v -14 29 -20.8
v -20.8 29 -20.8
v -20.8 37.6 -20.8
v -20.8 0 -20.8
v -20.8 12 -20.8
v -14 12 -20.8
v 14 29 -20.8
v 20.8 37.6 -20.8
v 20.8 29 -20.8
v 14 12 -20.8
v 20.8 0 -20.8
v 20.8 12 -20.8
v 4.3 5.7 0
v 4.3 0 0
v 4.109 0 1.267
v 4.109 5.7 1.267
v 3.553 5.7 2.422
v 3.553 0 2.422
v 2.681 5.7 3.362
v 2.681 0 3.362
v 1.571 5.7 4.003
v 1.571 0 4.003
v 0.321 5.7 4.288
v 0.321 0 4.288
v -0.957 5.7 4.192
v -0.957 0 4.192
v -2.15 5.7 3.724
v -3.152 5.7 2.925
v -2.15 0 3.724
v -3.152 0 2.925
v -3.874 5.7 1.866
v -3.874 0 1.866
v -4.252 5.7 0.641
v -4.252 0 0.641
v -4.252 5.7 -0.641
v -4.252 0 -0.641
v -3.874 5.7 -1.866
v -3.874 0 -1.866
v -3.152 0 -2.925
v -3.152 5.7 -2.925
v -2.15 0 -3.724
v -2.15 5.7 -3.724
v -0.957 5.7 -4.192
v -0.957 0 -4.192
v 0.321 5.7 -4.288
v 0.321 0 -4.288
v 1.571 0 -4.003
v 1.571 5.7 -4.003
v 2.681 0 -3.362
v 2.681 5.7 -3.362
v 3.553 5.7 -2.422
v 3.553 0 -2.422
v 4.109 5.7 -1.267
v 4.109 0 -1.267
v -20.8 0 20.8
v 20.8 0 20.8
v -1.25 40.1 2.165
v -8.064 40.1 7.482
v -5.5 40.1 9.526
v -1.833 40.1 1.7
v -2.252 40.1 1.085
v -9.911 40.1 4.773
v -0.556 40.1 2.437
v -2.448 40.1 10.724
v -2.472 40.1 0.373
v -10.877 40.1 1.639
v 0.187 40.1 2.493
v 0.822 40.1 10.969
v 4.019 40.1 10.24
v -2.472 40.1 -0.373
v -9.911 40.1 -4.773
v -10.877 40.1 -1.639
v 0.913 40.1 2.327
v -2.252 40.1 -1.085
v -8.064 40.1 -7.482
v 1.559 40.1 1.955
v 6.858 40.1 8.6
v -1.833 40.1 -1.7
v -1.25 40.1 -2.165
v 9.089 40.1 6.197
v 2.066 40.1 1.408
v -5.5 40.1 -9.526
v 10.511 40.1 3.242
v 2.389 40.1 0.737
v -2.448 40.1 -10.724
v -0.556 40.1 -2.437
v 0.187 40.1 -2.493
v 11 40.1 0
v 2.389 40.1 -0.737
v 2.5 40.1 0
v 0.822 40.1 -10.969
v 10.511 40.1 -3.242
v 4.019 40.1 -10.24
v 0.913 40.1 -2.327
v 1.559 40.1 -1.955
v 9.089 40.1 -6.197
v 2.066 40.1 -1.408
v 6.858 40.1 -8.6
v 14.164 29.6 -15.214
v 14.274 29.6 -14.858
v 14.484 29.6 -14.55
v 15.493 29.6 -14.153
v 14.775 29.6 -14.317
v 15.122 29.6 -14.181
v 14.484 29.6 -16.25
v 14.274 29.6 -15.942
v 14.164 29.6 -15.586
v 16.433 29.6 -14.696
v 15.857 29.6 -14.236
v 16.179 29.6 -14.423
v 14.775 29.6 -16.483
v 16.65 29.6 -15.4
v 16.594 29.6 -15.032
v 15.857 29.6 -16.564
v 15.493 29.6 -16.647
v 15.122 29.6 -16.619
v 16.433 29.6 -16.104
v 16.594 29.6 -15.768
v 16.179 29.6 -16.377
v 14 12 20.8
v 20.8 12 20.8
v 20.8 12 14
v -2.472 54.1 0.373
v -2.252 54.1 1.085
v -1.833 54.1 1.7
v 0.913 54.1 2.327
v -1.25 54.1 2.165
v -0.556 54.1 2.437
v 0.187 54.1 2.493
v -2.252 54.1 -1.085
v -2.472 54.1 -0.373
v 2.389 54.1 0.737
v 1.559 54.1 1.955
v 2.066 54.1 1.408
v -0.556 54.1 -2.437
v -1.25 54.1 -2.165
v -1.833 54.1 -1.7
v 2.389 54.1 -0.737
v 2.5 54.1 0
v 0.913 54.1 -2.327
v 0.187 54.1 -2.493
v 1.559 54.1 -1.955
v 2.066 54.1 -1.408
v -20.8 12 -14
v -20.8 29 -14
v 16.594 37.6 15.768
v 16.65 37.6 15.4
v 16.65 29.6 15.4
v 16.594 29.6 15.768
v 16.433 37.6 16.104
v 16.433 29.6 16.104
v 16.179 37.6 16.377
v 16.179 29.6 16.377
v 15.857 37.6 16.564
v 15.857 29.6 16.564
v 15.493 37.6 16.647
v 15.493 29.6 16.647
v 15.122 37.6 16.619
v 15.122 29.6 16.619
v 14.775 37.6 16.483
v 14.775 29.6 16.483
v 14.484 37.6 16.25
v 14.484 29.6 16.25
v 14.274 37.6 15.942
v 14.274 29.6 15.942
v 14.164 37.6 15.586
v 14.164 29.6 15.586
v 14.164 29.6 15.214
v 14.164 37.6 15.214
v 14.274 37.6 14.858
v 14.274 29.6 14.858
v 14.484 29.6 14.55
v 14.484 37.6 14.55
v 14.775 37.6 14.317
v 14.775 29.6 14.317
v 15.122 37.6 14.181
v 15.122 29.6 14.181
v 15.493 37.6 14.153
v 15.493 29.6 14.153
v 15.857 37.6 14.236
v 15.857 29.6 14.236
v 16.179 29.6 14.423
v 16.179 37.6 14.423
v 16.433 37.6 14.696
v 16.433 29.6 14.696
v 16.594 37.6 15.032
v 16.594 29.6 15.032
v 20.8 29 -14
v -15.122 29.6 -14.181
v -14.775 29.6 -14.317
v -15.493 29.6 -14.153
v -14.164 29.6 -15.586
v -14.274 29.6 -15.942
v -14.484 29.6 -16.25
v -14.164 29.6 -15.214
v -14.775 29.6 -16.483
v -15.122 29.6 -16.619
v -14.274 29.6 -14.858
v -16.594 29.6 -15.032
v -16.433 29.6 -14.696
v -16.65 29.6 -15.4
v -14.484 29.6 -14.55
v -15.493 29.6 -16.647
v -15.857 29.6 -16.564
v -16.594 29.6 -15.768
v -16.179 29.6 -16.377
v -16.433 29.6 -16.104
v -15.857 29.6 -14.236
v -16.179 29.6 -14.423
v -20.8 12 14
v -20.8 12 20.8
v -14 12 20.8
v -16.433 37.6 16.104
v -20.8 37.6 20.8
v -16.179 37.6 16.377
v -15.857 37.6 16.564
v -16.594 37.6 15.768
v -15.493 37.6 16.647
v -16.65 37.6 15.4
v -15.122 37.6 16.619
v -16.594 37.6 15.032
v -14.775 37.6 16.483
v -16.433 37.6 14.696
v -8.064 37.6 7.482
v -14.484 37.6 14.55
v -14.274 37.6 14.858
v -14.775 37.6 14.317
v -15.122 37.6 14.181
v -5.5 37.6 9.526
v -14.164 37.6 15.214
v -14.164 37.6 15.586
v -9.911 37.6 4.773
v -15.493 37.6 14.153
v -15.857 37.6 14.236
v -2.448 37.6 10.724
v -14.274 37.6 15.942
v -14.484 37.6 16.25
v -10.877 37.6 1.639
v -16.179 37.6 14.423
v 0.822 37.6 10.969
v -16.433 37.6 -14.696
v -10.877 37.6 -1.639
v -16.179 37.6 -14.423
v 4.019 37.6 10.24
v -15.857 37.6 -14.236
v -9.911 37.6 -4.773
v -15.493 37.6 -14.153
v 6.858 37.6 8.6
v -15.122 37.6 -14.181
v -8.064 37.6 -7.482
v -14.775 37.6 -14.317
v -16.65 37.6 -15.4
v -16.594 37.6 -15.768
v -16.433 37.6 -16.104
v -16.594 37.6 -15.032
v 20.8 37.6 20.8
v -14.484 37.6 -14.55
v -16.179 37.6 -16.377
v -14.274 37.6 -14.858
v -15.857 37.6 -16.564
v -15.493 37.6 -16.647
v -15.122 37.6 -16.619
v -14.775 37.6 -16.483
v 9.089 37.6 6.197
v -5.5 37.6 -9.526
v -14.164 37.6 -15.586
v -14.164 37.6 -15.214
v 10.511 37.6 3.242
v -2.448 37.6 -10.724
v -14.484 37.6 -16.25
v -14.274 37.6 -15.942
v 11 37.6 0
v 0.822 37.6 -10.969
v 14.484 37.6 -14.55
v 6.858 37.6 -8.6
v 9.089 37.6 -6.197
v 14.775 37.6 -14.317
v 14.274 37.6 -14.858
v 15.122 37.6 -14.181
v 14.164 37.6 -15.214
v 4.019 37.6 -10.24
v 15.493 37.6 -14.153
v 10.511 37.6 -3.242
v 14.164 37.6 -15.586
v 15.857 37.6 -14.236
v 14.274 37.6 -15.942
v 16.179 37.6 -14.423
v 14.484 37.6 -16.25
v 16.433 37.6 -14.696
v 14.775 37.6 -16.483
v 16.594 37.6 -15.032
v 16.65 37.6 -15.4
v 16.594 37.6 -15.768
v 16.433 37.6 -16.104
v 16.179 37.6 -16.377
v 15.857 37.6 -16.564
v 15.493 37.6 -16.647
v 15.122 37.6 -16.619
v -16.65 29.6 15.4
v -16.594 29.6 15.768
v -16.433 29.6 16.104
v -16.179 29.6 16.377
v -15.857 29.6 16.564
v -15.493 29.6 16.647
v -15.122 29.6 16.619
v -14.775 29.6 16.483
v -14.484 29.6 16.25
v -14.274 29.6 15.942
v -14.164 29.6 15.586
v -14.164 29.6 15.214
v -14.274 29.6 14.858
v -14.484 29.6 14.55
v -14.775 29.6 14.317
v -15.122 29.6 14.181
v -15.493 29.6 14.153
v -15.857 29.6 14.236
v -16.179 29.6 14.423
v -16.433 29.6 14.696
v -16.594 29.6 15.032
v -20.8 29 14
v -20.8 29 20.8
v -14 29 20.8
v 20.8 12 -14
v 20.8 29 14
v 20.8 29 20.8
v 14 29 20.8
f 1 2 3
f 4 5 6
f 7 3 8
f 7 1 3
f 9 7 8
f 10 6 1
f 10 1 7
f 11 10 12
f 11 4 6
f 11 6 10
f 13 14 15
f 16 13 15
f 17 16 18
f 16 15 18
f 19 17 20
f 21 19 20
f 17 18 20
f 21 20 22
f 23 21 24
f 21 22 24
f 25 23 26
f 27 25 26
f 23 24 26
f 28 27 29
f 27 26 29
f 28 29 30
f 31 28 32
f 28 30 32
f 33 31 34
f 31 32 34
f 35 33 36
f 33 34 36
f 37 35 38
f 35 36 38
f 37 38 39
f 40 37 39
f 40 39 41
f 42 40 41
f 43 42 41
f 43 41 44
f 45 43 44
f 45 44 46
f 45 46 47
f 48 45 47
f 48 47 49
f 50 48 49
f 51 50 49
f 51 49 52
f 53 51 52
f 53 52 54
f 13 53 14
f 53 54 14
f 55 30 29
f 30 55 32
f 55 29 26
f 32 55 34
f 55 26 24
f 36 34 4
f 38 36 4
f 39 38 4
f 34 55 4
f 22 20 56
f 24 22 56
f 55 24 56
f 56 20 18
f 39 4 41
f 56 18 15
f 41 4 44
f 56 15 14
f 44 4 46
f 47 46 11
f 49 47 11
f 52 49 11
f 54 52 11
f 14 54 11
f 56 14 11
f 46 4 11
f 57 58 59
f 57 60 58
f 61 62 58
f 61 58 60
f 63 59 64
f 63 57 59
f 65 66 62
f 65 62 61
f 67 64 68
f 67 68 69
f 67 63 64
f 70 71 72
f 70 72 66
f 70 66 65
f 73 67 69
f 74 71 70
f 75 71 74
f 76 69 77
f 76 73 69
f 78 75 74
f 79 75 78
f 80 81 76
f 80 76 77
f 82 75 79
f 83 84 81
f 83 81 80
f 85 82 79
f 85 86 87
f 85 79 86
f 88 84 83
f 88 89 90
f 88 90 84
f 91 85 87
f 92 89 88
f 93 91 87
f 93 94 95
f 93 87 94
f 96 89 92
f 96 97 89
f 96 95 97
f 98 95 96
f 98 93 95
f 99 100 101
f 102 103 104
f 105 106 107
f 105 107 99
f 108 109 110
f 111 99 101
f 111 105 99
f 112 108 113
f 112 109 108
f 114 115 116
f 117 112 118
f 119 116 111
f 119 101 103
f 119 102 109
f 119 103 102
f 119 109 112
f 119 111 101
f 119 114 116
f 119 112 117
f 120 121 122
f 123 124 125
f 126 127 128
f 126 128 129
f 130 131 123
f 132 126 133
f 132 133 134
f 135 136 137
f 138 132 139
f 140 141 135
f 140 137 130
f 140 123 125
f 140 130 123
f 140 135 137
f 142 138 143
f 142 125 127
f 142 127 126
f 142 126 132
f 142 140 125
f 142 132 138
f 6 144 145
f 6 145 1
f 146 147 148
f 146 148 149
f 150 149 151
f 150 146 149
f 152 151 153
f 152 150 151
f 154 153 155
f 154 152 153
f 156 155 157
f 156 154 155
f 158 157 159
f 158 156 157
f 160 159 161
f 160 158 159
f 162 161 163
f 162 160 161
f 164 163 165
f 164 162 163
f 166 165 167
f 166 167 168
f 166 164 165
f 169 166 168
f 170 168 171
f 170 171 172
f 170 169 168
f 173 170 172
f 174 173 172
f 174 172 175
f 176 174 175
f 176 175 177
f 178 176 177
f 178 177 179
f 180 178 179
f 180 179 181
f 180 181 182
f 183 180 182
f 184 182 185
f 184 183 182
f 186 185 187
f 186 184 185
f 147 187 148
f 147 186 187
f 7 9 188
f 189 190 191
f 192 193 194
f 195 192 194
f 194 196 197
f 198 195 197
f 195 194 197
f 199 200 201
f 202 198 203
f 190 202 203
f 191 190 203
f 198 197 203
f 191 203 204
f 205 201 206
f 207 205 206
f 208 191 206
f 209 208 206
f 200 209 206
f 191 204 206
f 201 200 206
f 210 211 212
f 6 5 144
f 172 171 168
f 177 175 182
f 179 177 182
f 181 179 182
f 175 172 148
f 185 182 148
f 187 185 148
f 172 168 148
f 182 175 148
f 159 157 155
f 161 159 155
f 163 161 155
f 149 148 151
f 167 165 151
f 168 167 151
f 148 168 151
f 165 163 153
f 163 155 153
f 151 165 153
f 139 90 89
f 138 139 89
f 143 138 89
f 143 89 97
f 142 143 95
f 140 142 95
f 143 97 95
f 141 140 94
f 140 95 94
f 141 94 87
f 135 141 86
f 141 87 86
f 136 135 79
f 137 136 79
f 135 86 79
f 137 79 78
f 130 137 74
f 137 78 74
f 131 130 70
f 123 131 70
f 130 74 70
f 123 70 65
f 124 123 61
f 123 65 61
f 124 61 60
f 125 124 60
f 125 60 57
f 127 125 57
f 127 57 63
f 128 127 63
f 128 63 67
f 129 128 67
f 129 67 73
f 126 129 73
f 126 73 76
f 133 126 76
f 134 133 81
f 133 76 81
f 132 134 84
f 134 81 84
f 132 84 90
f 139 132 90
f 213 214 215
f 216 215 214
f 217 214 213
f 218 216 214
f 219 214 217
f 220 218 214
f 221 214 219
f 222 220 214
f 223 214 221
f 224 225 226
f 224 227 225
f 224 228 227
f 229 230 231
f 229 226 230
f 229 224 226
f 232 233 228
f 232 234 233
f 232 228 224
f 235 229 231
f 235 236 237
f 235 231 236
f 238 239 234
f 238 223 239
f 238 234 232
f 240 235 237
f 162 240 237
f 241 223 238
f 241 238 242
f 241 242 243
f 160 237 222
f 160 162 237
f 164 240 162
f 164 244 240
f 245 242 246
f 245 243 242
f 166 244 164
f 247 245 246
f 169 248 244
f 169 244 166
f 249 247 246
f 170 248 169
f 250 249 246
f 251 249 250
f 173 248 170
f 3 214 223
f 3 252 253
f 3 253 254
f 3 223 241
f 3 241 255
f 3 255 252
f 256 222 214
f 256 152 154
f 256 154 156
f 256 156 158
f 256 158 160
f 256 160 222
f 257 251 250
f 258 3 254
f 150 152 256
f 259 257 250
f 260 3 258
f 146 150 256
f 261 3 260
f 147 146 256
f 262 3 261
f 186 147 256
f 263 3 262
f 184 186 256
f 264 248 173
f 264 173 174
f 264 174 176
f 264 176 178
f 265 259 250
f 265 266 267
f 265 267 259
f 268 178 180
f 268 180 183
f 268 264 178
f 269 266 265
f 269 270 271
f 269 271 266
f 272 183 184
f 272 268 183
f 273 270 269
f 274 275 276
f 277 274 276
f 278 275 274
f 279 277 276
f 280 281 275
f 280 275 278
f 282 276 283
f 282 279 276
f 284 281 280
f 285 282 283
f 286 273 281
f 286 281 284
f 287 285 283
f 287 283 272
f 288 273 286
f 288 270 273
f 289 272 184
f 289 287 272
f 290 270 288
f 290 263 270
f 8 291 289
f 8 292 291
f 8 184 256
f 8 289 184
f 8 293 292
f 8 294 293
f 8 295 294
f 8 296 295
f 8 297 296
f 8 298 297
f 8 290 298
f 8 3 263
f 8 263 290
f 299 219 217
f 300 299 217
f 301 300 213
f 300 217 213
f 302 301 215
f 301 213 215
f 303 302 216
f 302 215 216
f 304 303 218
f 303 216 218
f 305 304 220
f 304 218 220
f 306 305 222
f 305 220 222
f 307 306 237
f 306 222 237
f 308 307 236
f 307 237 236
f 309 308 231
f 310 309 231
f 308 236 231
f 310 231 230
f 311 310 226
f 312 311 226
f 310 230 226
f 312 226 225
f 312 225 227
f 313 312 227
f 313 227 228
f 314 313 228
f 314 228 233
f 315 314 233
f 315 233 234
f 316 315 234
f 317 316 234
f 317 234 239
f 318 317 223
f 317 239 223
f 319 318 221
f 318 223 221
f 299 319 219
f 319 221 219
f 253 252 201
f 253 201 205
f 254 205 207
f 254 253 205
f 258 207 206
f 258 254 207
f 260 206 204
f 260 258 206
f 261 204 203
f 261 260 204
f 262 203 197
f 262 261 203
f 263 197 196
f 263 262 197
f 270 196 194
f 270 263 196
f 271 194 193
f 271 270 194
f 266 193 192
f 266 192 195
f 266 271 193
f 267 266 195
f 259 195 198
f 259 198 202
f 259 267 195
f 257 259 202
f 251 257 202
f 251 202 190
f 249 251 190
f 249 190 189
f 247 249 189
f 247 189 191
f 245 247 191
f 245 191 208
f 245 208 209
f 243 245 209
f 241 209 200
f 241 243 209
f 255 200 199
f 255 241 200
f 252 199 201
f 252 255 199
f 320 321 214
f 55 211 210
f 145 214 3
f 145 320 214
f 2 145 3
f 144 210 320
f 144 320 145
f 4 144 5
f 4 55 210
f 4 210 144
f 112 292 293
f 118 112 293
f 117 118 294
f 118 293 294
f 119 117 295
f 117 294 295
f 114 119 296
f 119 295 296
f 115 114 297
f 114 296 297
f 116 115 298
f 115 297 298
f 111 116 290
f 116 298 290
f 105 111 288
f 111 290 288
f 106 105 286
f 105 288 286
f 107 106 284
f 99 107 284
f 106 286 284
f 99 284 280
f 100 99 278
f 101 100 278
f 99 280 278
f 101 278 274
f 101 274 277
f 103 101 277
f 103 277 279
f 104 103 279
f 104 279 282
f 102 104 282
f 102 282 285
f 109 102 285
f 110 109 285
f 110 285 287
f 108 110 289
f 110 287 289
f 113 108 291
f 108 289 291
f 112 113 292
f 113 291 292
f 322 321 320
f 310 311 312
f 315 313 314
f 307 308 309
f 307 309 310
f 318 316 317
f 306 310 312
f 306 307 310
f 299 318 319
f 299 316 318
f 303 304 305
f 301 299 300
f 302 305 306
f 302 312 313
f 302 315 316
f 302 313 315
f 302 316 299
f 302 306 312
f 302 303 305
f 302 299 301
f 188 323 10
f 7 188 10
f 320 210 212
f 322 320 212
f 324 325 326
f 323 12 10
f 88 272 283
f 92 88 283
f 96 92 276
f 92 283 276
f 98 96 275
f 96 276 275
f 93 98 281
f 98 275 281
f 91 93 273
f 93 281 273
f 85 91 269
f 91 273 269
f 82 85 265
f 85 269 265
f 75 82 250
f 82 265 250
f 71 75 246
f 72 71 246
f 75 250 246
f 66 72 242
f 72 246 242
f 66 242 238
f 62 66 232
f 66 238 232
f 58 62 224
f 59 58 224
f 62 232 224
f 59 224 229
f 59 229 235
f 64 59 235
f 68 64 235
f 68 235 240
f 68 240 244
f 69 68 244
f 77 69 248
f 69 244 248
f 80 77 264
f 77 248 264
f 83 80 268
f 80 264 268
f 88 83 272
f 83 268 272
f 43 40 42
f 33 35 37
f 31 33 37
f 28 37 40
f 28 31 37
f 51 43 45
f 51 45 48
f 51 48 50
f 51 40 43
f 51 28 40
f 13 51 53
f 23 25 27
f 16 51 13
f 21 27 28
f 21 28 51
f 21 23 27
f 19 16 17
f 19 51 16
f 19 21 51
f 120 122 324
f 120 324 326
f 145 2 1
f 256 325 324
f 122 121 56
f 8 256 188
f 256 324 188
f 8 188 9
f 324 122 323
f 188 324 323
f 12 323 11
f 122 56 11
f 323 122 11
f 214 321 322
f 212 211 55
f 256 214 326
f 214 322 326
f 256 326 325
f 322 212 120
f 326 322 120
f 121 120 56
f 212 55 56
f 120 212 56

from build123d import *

# Parameters (mm, degrees)
SKETCH1_W               = 41.6
SKETCH1_H               = 41.6
BOSS_EXTRUDE1_DEPTH     = 37.6
SKETCH2_R               = 11
BOSS_EXTRUDE2_DEPTH     = 2.5
SKETCH3_R               = 2.5
BOSS_EXTRUDE3_DEPTH     = 14
SKETCH4_R               = 1.25
CUT_EXTRUDE1_DEPTH      = 8
MIRROR2_COPY_1_SKETCH_R = 1.25
MIRROR2_COPY_1_DEPTH    = 8
CUT_EXTRUDE2_DEPTH      = 17
MIRROR4_COPY_1_DEPTH    = 17
SKETCH10_R              = 4.3
CUT_EXTRUDE3_DEPTH      = 5.7


with BuildPart() as part:
    # Sketch1 → Boss-Extrude1 (new body)
    with BuildSketch(Plane(origin=(0, 0, 0), x_dir=(1, 0, 0), z_dir=(0, 1, 0))):
        Rectangle(SKETCH1_W, SKETCH1_H)
    extrude(amount=BOSS_EXTRUDE1_DEPTH)

    # Sketch2 → Boss-Extrude2 (add)
    with BuildSketch(Plane(origin=(0, 37.6, 0), x_dir=(1, 0, 0), z_dir=(0, 1, 0))):
        Circle(SKETCH2_R)
    extrude(amount=BOSS_EXTRUDE2_DEPTH)

    # Sketch3 → Boss-Extrude3 (add)
    with BuildSketch(Plane(origin=(0, 40.1, 0), x_dir=(1, 0, 0), z_dir=(0, 1, 0))):
        Circle(SKETCH3_R)
    extrude(amount=BOSS_EXTRUDE3_DEPTH)

    # Sketch4 → Cut-Extrude1 (cut)
    with BuildSketch(Plane(origin=(0, 37.6, 0), x_dir=(1, 0, 0), z_dir=(0, 1, 0))):
        with Locations((15.4, 15.4)):
            Circle(SKETCH4_R)
    cut_extrude1 = extrude(amount=-CUT_EXTRUDE1_DEPTH, mode=Mode.SUBTRACT)

    # Mirror1: Cut-Extrude1 across plane
    add(cut_extrude1.mirror(Plane(origin=(0, 0, 0), x_dir=(0, 0, 1), z_dir=(1, 0, 0))), mode=Mode.SUBTRACT)

    # Mirror2: Cut-Extrude1 across plane
    add(cut_extrude1.mirror(Plane.XY), mode=Mode.SUBTRACT)

    # Mirror2 copy 1 sketch → Mirror2 copy 1 (cut)
    with BuildSketch(Plane(origin=(0, 37.6, 0), x_dir=(-1, 0, 0), z_dir=(0, 1, 0))):
        with Locations((15.4, 15.4)):
            Circle(MIRROR2_COPY_1_SKETCH_R)
    extrude(amount=-MIRROR2_COPY_1_DEPTH, mode=Mode.SUBTRACT)

    # Sketch9 → Cut-Extrude2 (cut)
    with BuildSketch(Plane(origin=(0, 12, 0), x_dir=(1, 0, 0), z_dir=(0, 1, 0))):
        Polygon((20.8, 14), (14, 20.8), (20.8, 20.8), align=None)
    cut_extrude2 = extrude(amount=CUT_EXTRUDE2_DEPTH, mode=Mode.SUBTRACT)

    # Mirror3: Cut-Extrude2 across plane
    add(cut_extrude2.mirror(Plane.XY), mode=Mode.SUBTRACT)

    # Mirror4: Cut-Extrude2 across plane
    add(cut_extrude2.mirror(Plane(origin=(0, 0, 0), x_dir=(0, 0, 1), z_dir=(1, 0, 0))), mode=Mode.SUBTRACT)

    # Mirror4 copy 1 sketch → Mirror4 copy 1 (cut)
    with BuildSketch(Plane(origin=(0, 12, 0), x_dir=(-1, 0, 0), z_dir=(0, 1, 0))):
        Polygon((20.8, 14), (14, 20.8), (20.8, 20.8), align=None)
    extrude(amount=MIRROR4_COPY_1_DEPTH, mode=Mode.SUBTRACT)

    # Sketch10 → Cut-Extrude3 (cut)
    with BuildSketch(Plane.XZ):
        Circle(SKETCH10_R)
    extrude(amount=-CUT_EXTRUDE3_DEPTH, mode=Mode.SUBTRACT)


solid = part.part
